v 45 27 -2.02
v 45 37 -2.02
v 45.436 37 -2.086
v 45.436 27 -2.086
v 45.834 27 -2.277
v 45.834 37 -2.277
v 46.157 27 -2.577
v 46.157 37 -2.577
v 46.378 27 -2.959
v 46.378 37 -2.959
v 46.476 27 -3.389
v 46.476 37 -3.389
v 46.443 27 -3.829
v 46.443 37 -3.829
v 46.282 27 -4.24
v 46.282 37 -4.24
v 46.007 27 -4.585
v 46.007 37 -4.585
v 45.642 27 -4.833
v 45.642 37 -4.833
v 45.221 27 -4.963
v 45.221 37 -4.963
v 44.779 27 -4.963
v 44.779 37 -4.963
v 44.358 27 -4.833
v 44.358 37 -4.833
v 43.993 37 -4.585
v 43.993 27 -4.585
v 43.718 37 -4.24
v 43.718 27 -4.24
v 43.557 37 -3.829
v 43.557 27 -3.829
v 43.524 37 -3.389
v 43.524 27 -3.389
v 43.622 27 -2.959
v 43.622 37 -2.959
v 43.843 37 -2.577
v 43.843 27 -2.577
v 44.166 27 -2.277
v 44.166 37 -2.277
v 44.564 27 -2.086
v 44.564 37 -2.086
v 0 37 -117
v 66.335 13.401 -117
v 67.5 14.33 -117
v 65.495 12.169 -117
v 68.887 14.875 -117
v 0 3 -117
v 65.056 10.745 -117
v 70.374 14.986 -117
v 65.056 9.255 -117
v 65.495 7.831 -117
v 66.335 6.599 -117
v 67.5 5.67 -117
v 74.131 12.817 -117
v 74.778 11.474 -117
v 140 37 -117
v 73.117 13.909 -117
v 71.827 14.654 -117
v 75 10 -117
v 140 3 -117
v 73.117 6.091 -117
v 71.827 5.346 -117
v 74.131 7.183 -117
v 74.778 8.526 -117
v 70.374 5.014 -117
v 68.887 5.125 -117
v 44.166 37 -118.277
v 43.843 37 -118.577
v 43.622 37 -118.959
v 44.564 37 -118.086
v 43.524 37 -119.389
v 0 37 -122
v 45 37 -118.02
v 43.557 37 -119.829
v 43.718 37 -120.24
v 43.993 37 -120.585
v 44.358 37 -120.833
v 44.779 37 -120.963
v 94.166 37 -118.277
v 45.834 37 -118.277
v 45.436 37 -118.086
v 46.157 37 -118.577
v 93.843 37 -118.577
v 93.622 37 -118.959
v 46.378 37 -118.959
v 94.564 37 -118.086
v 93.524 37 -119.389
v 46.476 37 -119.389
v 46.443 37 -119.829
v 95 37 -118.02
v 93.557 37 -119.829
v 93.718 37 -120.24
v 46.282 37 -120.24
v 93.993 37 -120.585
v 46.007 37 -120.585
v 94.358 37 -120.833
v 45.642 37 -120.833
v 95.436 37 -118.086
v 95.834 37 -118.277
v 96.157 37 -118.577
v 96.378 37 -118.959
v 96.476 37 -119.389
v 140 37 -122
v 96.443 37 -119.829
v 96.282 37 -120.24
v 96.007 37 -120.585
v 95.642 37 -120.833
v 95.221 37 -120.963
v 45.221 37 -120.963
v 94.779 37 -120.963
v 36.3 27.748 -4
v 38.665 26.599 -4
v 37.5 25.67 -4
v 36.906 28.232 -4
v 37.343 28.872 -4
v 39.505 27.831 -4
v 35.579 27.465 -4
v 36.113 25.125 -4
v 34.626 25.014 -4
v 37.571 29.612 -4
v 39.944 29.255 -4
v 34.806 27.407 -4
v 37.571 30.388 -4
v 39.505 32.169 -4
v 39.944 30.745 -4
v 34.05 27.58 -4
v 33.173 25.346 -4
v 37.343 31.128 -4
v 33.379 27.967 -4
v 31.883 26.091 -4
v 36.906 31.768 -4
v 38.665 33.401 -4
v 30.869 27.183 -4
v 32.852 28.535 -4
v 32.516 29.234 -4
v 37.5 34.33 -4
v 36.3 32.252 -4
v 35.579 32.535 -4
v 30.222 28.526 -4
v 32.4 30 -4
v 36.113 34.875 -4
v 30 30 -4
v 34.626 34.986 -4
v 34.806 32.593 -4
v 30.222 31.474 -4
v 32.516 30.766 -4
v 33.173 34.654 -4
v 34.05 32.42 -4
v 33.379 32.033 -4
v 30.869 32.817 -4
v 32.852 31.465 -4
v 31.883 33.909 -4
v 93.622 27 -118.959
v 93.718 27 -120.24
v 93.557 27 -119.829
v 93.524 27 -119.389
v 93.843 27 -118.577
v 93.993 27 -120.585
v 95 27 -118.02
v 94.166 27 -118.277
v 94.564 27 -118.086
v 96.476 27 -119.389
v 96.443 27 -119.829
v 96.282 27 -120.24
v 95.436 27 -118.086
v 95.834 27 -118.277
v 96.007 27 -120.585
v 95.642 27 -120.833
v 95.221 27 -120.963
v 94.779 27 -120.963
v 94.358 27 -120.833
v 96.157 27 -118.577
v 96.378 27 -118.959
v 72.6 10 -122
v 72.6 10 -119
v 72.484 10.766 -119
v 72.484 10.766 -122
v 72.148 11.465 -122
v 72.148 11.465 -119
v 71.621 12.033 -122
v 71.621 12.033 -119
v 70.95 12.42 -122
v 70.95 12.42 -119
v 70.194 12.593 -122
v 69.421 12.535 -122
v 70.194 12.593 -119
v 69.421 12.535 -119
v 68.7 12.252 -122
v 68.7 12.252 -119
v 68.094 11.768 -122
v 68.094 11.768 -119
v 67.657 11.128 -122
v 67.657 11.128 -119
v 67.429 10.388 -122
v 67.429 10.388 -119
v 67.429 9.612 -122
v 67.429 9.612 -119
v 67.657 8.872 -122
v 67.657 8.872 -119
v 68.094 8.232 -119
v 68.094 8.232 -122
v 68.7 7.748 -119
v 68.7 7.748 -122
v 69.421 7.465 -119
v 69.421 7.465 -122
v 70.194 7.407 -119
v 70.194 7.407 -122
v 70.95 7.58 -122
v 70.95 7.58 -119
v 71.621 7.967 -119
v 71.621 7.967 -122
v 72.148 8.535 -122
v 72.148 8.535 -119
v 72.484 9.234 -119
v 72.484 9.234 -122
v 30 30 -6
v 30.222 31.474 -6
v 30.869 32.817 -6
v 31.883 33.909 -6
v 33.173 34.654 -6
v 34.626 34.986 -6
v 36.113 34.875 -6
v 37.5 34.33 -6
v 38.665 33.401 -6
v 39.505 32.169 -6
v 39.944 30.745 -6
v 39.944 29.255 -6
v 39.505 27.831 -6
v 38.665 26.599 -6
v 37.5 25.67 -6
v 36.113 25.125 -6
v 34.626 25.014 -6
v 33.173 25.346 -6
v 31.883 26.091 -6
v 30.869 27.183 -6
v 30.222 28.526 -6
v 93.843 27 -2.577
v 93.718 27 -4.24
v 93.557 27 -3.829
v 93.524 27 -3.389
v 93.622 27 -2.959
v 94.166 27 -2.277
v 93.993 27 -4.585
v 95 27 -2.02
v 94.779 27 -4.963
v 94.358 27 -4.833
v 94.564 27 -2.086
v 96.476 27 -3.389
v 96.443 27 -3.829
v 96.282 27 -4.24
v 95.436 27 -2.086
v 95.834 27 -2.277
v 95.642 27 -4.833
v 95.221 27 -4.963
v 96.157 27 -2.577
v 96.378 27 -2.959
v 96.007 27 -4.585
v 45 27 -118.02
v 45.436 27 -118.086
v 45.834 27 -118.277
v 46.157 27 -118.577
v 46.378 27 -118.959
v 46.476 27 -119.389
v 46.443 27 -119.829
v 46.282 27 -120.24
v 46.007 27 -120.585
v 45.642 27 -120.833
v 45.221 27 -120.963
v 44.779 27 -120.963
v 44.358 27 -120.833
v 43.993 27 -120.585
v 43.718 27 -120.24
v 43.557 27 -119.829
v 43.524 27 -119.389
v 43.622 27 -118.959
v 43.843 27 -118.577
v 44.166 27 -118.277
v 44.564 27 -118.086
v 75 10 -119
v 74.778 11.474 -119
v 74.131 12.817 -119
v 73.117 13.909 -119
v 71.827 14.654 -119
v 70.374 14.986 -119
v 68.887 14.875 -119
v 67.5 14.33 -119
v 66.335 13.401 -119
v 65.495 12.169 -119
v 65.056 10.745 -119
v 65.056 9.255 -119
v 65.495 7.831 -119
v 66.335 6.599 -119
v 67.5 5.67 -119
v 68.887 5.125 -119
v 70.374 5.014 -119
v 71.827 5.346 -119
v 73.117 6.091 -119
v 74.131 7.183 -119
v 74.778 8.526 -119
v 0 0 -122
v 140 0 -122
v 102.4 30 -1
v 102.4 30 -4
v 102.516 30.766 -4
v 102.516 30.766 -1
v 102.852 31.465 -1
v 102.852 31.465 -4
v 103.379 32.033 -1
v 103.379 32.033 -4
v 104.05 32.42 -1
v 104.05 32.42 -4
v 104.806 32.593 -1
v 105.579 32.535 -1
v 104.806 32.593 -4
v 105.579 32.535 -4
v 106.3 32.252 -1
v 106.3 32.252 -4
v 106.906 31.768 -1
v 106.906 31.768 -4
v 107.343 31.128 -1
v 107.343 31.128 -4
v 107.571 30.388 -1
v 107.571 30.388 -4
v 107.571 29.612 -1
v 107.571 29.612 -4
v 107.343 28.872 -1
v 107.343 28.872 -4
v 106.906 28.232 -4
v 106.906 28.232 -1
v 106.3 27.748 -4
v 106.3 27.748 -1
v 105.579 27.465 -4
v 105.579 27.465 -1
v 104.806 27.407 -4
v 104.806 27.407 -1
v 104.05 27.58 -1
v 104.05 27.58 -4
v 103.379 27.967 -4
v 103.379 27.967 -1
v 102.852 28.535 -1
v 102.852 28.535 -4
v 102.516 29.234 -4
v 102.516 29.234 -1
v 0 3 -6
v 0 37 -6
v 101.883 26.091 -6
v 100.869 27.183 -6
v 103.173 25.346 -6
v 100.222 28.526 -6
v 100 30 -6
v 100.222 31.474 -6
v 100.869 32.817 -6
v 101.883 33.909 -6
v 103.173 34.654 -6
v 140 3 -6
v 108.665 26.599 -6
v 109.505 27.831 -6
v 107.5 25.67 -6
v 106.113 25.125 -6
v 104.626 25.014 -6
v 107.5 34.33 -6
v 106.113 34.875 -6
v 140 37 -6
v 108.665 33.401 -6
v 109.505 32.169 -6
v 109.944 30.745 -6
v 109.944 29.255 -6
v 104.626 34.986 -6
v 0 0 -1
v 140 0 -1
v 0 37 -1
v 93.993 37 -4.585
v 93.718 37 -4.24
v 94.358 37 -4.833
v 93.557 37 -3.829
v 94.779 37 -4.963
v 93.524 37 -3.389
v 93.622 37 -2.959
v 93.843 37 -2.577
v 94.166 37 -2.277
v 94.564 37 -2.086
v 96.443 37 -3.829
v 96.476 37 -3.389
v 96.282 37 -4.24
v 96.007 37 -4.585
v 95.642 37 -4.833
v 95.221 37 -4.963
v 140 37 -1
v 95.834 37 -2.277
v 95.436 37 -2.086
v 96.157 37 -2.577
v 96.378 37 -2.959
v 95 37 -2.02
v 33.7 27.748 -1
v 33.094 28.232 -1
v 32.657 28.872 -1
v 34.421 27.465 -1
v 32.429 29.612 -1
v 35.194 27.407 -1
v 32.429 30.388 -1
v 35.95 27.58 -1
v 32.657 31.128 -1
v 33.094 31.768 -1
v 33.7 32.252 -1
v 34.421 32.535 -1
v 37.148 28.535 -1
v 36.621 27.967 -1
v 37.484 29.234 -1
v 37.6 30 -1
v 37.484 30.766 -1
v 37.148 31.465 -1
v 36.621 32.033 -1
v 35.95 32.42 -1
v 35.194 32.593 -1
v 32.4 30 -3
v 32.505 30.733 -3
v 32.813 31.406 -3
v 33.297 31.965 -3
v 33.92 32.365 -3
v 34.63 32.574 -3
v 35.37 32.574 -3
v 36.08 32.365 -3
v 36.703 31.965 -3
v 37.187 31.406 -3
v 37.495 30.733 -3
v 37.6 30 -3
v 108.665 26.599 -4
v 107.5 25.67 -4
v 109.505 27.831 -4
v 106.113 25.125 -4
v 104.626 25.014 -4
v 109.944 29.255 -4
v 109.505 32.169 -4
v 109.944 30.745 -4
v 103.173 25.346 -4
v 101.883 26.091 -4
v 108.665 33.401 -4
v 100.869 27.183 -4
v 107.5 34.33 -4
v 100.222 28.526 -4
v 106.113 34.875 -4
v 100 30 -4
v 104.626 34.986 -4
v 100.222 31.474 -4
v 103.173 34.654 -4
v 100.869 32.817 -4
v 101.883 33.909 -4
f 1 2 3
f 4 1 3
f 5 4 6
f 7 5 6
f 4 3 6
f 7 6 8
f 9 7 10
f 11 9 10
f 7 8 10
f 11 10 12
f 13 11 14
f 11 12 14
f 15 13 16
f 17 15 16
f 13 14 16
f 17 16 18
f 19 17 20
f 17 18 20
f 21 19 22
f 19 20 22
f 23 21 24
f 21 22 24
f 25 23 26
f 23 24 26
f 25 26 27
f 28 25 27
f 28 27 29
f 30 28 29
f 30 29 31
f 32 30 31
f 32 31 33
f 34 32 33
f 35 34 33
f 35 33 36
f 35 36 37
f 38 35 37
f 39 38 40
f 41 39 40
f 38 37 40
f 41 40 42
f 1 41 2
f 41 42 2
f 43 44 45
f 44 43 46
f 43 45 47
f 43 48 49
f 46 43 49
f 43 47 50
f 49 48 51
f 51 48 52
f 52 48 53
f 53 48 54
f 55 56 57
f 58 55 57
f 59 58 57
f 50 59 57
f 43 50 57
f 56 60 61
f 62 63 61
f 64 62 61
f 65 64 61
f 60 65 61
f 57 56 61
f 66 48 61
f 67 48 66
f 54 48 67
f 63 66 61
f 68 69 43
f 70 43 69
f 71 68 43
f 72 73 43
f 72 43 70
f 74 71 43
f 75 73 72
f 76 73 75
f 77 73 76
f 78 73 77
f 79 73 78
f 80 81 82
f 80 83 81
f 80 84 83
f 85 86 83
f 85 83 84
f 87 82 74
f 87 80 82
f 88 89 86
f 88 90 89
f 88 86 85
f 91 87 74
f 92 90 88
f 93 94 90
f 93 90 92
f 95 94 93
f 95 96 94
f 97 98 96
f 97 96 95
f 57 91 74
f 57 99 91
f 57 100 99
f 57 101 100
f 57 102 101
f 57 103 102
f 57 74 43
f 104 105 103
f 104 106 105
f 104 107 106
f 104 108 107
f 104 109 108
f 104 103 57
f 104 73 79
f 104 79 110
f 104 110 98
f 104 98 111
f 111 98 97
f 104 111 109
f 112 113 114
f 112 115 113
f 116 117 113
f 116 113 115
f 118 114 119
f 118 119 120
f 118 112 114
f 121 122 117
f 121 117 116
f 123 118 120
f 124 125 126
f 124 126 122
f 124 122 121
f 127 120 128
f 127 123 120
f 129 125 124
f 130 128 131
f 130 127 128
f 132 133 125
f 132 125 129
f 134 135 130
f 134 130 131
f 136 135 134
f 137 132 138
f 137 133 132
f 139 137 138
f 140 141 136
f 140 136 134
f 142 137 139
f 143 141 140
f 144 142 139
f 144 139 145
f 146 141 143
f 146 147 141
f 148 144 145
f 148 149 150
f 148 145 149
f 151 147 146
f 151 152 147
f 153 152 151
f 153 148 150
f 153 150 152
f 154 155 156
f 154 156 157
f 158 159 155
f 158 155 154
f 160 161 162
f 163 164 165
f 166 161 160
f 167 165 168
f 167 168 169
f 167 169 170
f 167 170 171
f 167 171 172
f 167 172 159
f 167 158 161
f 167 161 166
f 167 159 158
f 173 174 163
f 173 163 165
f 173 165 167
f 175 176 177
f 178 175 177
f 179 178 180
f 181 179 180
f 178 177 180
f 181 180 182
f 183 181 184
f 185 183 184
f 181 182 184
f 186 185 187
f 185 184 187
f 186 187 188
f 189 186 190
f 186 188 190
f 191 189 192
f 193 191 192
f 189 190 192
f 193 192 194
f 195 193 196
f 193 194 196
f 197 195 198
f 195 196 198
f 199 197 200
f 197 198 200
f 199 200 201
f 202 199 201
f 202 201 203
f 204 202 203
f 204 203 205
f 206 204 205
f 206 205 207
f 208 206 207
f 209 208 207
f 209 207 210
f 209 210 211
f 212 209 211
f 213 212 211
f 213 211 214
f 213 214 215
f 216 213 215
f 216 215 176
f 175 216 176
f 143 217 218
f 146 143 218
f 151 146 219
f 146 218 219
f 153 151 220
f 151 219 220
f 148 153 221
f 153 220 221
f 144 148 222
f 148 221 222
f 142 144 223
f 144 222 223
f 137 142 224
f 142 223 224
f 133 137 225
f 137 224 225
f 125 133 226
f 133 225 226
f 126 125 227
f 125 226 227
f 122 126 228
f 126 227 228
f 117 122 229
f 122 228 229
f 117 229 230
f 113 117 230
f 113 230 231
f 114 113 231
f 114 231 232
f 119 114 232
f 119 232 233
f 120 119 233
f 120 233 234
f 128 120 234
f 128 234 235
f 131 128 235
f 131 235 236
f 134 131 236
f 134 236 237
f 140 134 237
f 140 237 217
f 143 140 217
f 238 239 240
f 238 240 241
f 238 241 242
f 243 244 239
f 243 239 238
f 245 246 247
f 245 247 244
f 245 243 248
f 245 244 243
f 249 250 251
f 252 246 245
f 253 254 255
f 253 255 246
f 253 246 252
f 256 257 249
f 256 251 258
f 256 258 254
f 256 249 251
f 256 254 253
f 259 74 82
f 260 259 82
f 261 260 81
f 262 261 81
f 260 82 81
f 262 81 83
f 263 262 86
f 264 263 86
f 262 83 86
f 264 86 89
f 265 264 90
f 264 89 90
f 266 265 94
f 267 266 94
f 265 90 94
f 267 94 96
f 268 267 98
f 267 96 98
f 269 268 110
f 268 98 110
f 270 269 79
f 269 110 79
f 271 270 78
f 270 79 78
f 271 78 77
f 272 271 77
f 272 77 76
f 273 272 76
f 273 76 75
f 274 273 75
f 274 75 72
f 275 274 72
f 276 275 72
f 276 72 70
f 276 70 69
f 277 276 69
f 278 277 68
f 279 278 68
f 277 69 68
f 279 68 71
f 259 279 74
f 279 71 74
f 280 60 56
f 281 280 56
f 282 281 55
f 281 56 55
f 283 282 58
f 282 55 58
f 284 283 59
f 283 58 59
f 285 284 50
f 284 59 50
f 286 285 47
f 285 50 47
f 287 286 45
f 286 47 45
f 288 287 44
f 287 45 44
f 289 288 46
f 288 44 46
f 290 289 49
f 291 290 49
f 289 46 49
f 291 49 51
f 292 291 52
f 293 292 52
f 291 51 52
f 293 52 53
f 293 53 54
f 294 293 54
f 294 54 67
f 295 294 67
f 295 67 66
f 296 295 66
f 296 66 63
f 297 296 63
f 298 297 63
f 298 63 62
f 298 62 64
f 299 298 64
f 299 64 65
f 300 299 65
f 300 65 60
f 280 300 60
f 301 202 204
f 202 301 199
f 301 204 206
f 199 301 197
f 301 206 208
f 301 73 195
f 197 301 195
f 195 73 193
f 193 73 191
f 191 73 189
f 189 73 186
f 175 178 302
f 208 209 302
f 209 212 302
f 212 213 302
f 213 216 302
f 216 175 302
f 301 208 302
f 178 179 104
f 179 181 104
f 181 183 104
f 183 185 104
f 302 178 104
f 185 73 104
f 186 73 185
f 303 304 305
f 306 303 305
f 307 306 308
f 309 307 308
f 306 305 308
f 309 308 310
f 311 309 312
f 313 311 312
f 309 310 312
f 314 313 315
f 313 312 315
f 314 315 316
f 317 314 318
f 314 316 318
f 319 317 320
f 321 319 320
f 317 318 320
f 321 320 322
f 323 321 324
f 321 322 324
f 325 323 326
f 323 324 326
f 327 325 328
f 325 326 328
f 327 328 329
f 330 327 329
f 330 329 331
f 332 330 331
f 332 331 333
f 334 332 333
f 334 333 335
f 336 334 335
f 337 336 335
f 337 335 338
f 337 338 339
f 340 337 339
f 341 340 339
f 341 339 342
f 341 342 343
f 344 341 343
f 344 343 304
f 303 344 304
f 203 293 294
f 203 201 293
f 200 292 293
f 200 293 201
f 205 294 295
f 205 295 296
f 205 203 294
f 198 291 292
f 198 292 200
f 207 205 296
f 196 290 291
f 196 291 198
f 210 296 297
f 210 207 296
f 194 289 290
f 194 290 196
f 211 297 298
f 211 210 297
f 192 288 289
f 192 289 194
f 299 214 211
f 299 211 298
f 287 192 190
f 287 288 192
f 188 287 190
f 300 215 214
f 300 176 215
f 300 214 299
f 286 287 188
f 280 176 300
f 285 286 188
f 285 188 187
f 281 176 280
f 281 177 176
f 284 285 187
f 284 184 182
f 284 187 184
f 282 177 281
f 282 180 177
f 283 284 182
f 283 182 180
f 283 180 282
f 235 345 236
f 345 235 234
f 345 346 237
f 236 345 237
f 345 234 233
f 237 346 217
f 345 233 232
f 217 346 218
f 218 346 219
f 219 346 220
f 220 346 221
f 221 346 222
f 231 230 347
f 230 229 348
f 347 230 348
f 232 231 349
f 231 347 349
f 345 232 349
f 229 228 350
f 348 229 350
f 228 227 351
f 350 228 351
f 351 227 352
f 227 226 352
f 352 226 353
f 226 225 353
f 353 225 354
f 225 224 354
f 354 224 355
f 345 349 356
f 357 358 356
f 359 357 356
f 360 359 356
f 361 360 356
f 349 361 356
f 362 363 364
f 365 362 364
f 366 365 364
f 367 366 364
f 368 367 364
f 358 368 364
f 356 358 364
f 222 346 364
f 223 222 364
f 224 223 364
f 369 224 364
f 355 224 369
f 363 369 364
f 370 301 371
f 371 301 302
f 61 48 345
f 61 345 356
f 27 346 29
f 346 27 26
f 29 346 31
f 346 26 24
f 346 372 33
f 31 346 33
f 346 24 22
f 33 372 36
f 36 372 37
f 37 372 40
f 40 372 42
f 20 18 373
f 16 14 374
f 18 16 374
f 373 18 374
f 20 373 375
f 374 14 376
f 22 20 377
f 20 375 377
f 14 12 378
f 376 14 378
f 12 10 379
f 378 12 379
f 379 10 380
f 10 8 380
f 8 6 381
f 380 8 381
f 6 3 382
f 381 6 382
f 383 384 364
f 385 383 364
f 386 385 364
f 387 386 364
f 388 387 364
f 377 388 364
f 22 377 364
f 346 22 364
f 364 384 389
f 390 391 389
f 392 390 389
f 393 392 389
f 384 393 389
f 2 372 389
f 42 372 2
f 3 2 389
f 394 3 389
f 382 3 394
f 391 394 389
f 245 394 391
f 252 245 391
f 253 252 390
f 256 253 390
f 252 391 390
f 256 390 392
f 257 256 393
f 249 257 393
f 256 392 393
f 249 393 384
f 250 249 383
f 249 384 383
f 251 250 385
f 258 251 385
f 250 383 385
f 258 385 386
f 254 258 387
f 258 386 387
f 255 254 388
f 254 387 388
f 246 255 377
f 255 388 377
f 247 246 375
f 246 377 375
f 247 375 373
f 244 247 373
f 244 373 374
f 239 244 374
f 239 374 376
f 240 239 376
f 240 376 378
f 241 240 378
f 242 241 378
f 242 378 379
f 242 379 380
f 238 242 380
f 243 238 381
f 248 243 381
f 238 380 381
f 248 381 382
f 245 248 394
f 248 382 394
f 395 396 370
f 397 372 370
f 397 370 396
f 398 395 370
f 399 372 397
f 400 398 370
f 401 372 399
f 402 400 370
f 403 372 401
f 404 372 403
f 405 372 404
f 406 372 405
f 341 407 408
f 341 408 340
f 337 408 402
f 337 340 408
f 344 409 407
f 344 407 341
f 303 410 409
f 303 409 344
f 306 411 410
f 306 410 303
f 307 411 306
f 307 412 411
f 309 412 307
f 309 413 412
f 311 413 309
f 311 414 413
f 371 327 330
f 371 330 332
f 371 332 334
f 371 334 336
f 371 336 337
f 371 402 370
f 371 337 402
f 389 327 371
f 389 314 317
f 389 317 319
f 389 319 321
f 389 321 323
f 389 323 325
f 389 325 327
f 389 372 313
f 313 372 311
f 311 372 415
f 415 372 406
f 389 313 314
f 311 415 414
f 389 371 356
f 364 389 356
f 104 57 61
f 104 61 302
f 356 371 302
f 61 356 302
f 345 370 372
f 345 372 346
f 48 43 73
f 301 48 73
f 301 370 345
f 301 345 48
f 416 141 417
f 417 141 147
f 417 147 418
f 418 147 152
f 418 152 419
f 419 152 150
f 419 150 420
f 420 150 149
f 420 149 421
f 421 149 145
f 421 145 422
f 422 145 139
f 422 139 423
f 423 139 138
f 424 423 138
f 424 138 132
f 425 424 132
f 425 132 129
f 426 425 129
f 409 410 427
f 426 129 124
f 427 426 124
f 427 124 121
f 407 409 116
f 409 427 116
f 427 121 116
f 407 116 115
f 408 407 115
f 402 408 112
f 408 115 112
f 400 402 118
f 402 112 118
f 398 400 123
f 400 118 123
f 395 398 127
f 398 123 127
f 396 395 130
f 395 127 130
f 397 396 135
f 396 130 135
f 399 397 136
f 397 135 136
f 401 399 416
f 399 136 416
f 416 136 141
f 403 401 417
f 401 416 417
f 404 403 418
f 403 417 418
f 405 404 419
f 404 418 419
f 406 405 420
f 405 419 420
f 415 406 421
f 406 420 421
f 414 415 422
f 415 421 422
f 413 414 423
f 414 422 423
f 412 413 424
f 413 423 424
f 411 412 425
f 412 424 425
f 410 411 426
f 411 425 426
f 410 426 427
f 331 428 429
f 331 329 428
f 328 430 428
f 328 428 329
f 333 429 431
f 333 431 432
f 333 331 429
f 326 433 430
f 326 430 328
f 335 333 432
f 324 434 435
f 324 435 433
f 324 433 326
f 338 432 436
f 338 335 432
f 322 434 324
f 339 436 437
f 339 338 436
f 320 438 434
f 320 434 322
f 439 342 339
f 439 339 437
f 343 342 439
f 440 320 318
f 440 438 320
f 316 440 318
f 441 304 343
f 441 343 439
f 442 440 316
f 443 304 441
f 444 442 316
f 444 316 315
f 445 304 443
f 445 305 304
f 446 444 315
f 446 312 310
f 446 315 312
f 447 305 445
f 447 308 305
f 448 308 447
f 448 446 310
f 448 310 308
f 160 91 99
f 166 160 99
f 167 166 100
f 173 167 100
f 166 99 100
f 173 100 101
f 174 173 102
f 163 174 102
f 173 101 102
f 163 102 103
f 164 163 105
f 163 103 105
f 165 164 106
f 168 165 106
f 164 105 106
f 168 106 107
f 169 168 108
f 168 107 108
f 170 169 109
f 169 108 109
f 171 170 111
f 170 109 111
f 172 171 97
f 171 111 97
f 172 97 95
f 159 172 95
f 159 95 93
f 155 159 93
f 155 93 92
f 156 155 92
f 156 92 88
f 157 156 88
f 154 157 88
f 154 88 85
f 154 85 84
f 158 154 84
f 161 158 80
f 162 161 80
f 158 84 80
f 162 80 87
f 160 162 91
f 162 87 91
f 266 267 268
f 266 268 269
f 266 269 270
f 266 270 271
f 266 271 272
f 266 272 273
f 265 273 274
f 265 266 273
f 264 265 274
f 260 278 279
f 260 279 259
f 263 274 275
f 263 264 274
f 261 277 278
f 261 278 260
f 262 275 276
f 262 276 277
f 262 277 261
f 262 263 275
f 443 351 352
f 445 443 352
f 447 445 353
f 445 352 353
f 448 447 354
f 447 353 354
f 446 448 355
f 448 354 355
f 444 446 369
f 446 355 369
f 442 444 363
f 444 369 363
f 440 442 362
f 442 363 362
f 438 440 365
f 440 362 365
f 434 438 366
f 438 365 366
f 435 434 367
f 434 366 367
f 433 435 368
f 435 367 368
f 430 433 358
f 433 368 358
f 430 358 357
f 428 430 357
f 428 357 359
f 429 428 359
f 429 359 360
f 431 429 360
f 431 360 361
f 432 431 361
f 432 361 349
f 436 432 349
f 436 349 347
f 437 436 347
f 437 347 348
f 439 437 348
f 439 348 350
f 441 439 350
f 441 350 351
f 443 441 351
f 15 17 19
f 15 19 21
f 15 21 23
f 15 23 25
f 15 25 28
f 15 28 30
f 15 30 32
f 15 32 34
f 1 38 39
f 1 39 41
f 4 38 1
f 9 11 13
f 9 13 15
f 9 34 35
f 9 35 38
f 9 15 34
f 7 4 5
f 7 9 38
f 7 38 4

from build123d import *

# Parameters (mm, degrees)
SKETCH_1_W           = 150
SKETCH_1_H           = 123
SKETCH_1_R           = 1.5
EXTRUDE_1_DEPTH      = 3
SKETCH_2_W           = 150
SKETCH_2_H           = 6
EXTRUDE_2_DEPTH      = 17
SKETCH_3_W           = 75
SKETCH_3_H           = 6
EXTRUDE_3_DEPTH      = 37
SKETCH_4_W           = 150
SKETCH_4_H           = 111
EXTRUDE_4_DEPTH      = 3
SKETCH_6_W           = 10
SKETCH_6_H           = 123
CUT_EXTRUDE_1_DEPTH  = 50
SKETCH_7_W           = 3
SKETCH_7_H           = 101
EXTRUDE_5_DEPTH      = 17
SKETCH_9_W           = 75
SKETCH_9_H           = 6
EXTRUDE_6_DEPTH      = 37
CUT_EXTRUDE_2_DEPTH  = 37
SKETCH_12_R          = 5
CUT_EXTRUDE_3_DEPTH  = 3
CUT_EXTRUDE_5_DEPTH  = 6
SKETCH_14_R          = 5
CUT_EXTRUDE_6_DEPTH  = 3
SKETCH_15_W          = 140
SKETCH_15_H          = 3
CUT_EXTRUDE_7_DEPTH  = 6
SKETCH_17_W          = 140
SKETCH_17_H          = 6
SKETCH_17_W_2        = 3
SKETCH_17_H_2        = 101
EXTRUDE_7_DEPTH      = 17
SKETCH_19_W          = 140
SKETCH_19_H          = 1
CUT_EXTRUDE_10_DEPTH = 50
SKETCH_20_W          = 140
SKETCH_20_H          = 1
CUT_EXTRUDE_11_DEPTH = 50
SKETCH_21_W          = 3
SKETCH_21_H          = 101
CUT_EXTRUDE_12_DEPTH = 34
SKETCH_22_R          = 1.48
CUT_EXTRUDE_13_DEPTH = 10
EXTRUDE_START        = 1
SKETCH_23_R          = 5
SKETCH_23_R_2        = 2.6
EXTRUDE_8_DEPTH      = 1
SKETCH_24_R          = 5
SKETCH_24_R_2        = 2.6
EXTRUDE_9_DEPTH      = 1


with BuildPart() as part:
    # 草图1 → 凸台-拉伸1 (new body)
    with BuildSketch(Plane(origin=(0, 0, 0), x_dir=(1, 0, 0), z_dir=(0, 1, 0))):
        with Locations((75, 61.5)):
            Rectangle(SKETCH_1_W, SKETCH_1_H)
        with Locations(Location((19, 102.5, 0), (0, 0, 270))):
            Circle(SKETCH_1_R, mode=Mode.SUBTRACT)
        with Locations(Location((19, 20.5, 0), (0, 0, 270))):
            Circle(SKETCH_1_R, mode=Mode.SUBTRACT)
        with Locations(Location((141, 20.5, 0), (0, 0, 270))):
            Circle(SKETCH_1_R, mode=Mode.SUBTRACT)
        with Locations(Location((141, 102.5, 0), (0, 0, 270))):
            Circle(SKETCH_1_R, mode=Mode.SUBTRACT)
    extrude(amount=EXTRUDE_1_DEPTH)

    # 草图2 → 凸台-拉伸2 (add)
    with BuildSketch(Plane(origin=(0, 3, 0), x_dir=(1, 0, 0), z_dir=(0, 1, 0))):
        with Locations((75, 120)):
            Rectangle(SKETCH_2_W, SKETCH_2_H)
    extrude(amount=EXTRUDE_2_DEPTH)

    # 草图3 → 凸台-拉伸3 (add)
    with BuildSketch(Plane(origin=(0, 3, 0), x_dir=(1, 0, 0), z_dir=(0, 1, 0))):
        with Locations((112.5, 3)):
            Rectangle(SKETCH_3_W, SKETCH_3_H)
    extrude(amount=EXTRUDE_3_DEPTH)

    # 草图4 → 凸台-拉伸4 (add)
    with BuildSketch(Plane(origin=(0, 3, 0), x_dir=(1, 0, 0), z_dir=(0, 1, 0))):
        with Locations((75, 61.5)):
            Rectangle(SKETCH_4_W, SKETCH_4_H)
    extrude(amount=-EXTRUDE_4_DEPTH)

    # 草图6 → 切除-拉伸1 (cut)
    with BuildSketch(Plane.XZ):
        with Locations((145, -61.5)):
            Rectangle(SKETCH_6_W, SKETCH_6_H)
    extrude(amount=-CUT_EXTRUDE_1_DEPTH, mode=Mode.SUBTRACT)

    # 草图7 → 凸台-拉伸5 (add)
    with BuildSketch(Plane(origin=(0, 3, 0), x_dir=(1, 0, 0), z_dir=(0, 1, 0))):
        with Locations((1.5, 56.5)):
            Rectangle(SKETCH_7_W, SKETCH_7_H)
    extrude(amount=EXTRUDE_5_DEPTH)

    # 草图9 → 凸台-拉伸6 (add)
    with BuildSketch(Plane(origin=(0, 3, 0), x_dir=(1, 0, 0), z_dir=(0, 1, 0))):
        with Locations((37.5, 3)):
            Rectangle(SKETCH_9_W, SKETCH_9_H)
    extrude(amount=EXTRUDE_6_DEPTH)

    # 草图11 → 切除-拉伸2 (cut)
    with BuildSketch(Plane(origin=(0, 0, -6), x_dir=(-1, 0, 0), z_dir=(0, 0, -1))):
        with BuildLine():
            ThreePointArc((-107.6, 30), (-105, 27.4), (-102.4, 30))
            Line((-102.4, 30), (-107.6, 30))
        make_face()
        with BuildLine():
            Line((-107.6, 30), (-102.4, 30))
            ThreePointArc((-102.4, 30), (-105, 32.6), (-107.6, 30))
        make_face()
        with BuildLine():
            ThreePointArc((-32.4, 30), (-35, 32.6), (-37.6, 30))
            Line((-37.6, 30), (-32.4, 30))
        make_face()
        with BuildLine():
            Line((-32.4, 30), (-37.6, 30))
            ThreePointArc((-37.6, 30), (-35, 27.4), (-32.4, 30))
        make_face()
    extrude(amount=-CUT_EXTRUDE_2_DEPTH, mode=Mode.SUBTRACT)

    # 草图12 → 切除-拉伸3 (cut)
    with BuildSketch(Plane(origin=(0, 0, -6), x_dir=(-1, 0, 0), z_dir=(0, 0, -1))):
        with Locations((-105, 30)):
            Circle(SKETCH_12_R)
        with Locations((-35, 30)):
            Circle(SKETCH_12_R)
    extrude(amount=-CUT_EXTRUDE_3_DEPTH, mode=Mode.SUBTRACT)

    # 草图13 → 切除-拉伸5 (cut)
    with BuildSketch(Plane.XY.offset(-117)):
        with BuildLine():
            ThreePointArc((67.4, 10), (70, 7.4), (72.6, 10))
            Line((72.6, 10), (67.4, 10))
        make_face()
        with BuildLine():
            Line((67.4, 10), (72.6, 10))
            ThreePointArc((72.6, 10), (70, 12.6), (67.4, 10))
        make_face()
    extrude(amount=-CUT_EXTRUDE_5_DEPTH, mode=Mode.SUBTRACT)

    # 草图14 → 切除-拉伸6 (cut)
    with BuildSketch(Plane.XY.offset(-117)):
        with Locations((70, 10)):
            Circle(SKETCH_14_R)
    extrude(amount=-CUT_EXTRUDE_6_DEPTH, mode=Mode.SUBTRACT)

    # 草图15 → 切除-拉伸7 (cut)
    with BuildSketch(Plane.XY):
        with Locations((70, 38.5)):
            Rectangle(SKETCH_15_W, SKETCH_15_H)
    extrude(amount=-CUT_EXTRUDE_7_DEPTH, mode=Mode.SUBTRACT)

    # 草图17 → 凸台-拉伸7 (add)
    with BuildSketch(Plane(origin=(0, 20, 0), x_dir=(1, 0, 0), z_dir=(0, 1, 0))):
        with Locations((70, 120)):
            Rectangle(SKETCH_17_W, SKETCH_17_H)
        with Locations((1.5, 56.5)):
            Rectangle(SKETCH_17_W_2, SKETCH_17_H_2)
    extrude(amount=EXTRUDE_7_DEPTH)

    # 草图19 → 切除-拉伸10 (cut)
    with BuildSketch(Plane(origin=(0, 37, 0), x_dir=(1, 0, 0), z_dir=(0, 1, 0))):
        with Locations((70, 122.5)):
            Rectangle(SKETCH_19_W, SKETCH_19_H)
    extrude(amount=-CUT_EXTRUDE_10_DEPTH, mode=Mode.SUBTRACT)

    # 草图20 → 切除-拉伸11 (cut)
    with BuildSketch(Plane(origin=(0, 37, 0), x_dir=(1, 0, 0), z_dir=(0, 1, 0))):
        with Locations((70, 0.5)):
            Rectangle(SKETCH_20_W, SKETCH_20_H)
    extrude(amount=-CUT_EXTRUDE_11_DEPTH, mode=Mode.SUBTRACT)

    # 草图21 → 切除-拉伸12 (cut)
    with BuildSketch(Plane(origin=(0, 37, 0), x_dir=(1, 0, 0), z_dir=(0, 1, 0))):
        with Locations((1.5, 56.5)):
            Rectangle(SKETCH_21_W, SKETCH_21_H)
    extrude(amount=-CUT_EXTRUDE_12_DEPTH, mode=Mode.SUBTRACT)

    # 草图22 → 切除-拉伸13 (cut)
    with BuildSketch(Plane(origin=(0, 37, 0), x_dir=(1, 0, 0), z_dir=(0, 1, 0))):
        with Locations(Location((95, 119.5, 0), (0, 0, 270))):
            Circle(SKETCH_22_R)
        with Locations(Location((45, 119.5, 0), (0, 0, 270))):
            Circle(SKETCH_22_R)
        with Locations(Location((45, 3.5, 0), (0, 0, 270))):
            Circle(SKETCH_22_R)
        with Locations(Location((95, 3.5, 0), (0, 0, 270))):
            Circle(SKETCH_22_R)
    extrude(amount=-CUT_EXTRUDE_13_DEPTH, mode=Mode.SUBTRACT)

    # 草图23 → 凸台-拉伸8 (add)
    with BuildSketch(Plane.XY.offset(-120).offset(EXTRUDE_START)):
        with Locations((70, 10)):
            Circle(SKETCH_23_R)
        with Locations((70, 10)):
            Circle(SKETCH_23_R_2, mode=Mode.SUBTRACT)
    extrude(amount=-EXTRUDE_8_DEPTH)

    # 草图24 → 凸台-拉伸9 (add)
    # profile 1 of 2: a face of its own
    with BuildSketch(Plane(origin=(0, 0, -3), x_dir=(-1, 0, 0), z_dir=(0, 0, -1)).offset(EXTRUDE_START)):
        with Locations((-105, 30)):
            Circle(SKETCH_24_R)
        with Locations((-105, 30)):
            Circle(SKETCH_24_R_2, mode=Mode.SUBTRACT)
    # profile 2 of 2: a face of its own
    with BuildSketch(Plane(origin=(0, 0, -3), x_dir=(-1, 0, 0), z_dir=(0, 0, -1)).offset(EXTRUDE_START)):
        with Locations((-35, 30)):
            Circle(SKETCH_24_R)
        with Locations((-35, 30)):
            Circle(SKETCH_24_R_2, mode=Mode.SUBTRACT)
    extrude(amount=-EXTRUDE_9_DEPTH)


solid = part.part
